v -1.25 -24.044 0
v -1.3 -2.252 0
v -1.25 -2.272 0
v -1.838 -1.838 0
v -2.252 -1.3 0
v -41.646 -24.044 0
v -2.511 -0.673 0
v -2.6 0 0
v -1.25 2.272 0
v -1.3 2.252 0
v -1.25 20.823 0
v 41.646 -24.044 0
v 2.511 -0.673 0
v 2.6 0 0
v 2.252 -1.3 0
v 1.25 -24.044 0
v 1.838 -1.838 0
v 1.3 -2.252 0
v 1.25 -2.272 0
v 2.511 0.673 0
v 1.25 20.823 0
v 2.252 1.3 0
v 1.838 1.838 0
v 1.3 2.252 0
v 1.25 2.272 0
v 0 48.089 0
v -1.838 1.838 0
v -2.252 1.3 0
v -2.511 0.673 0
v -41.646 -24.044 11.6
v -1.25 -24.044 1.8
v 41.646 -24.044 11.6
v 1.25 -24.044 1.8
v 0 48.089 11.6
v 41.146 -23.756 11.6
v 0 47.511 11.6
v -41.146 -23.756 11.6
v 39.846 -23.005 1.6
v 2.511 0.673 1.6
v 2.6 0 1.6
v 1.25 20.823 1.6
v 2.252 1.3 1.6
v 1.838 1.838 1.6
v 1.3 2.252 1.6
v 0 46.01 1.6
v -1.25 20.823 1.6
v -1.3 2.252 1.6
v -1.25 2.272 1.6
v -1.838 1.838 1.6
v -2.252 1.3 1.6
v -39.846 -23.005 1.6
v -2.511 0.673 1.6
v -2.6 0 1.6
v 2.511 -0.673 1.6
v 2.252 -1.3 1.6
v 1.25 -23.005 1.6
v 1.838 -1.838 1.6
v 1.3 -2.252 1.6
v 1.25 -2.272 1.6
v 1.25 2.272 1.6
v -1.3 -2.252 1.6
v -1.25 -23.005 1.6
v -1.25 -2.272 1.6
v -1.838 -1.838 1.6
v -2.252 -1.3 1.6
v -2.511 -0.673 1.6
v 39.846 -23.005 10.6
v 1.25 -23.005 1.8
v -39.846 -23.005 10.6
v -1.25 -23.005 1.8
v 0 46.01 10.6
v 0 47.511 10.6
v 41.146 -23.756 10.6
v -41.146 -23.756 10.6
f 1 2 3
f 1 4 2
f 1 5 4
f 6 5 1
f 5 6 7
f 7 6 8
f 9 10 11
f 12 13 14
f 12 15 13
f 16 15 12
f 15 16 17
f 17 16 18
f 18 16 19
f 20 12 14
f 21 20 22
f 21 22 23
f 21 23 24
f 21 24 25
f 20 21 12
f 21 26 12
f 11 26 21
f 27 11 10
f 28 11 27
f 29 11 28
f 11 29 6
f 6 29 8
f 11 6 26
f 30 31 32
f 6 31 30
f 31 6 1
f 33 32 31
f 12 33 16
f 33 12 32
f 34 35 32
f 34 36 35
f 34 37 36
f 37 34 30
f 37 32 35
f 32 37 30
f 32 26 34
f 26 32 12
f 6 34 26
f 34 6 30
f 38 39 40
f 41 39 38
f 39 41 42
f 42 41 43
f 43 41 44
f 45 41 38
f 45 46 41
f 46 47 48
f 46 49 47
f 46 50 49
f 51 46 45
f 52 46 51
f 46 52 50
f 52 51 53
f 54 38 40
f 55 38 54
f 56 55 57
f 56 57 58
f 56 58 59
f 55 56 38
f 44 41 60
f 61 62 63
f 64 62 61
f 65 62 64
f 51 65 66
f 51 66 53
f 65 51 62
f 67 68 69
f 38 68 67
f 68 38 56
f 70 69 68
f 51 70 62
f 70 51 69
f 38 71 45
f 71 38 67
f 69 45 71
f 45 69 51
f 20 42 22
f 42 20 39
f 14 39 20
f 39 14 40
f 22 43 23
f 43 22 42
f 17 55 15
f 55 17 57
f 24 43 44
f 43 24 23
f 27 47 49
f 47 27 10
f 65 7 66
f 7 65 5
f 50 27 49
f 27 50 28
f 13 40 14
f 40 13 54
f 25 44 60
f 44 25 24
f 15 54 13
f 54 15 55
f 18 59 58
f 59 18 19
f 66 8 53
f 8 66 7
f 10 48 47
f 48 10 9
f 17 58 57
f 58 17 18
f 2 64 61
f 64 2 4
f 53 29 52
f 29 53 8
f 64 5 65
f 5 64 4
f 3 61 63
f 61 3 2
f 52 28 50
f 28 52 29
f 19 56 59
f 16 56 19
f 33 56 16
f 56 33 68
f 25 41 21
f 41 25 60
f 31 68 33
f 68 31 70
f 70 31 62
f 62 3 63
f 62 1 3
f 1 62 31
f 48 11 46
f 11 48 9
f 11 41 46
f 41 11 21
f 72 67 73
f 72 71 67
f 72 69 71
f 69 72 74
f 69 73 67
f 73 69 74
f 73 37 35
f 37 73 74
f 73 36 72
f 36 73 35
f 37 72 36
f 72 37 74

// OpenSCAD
// file: params.scad
// Glorb — shared parameters (include from other files)
// Units: millimeters
// Design OD ~12 in → R = 152.4 mm to outer diffuser face

RADIUS_MM = 152.4;

// Strut chords at RADIUS_MM (from mesh/edge_lengths.csv)
STRUT_SHORT = 83.292;
STRUT_LONG  = 94.188;

// Frame (no hub nodes) — faceplate rabbet
FACEPLATE_T = 1.0;       // flush pocket depth
RIM = 2.0;               // outer rim outside faceplate
LEDGE = 1.5;             // support under faceplate
STRUT_DEPTH = 8.0;       // frame thickness inward

// Hub / strut interface (legacy OpenSCAD struts — superseded by Frame_Channels)
STRUT_OD = 6.0;
STRUT_ID = 3.2;
HUB_SOCKET_DEPTH = 6.0;
HUB_BALL = 14.0;

// Light cup (optional alternate architecture)
CUP_WALL = 1.8;
CUP_DEPTH = 10.0;
CUP_FLOOR = 1.6;
LED_BORE = 5.2;
LED_WIRE_SLOT = 2.5;

// Diffuser / faceplate
DIFFUSER_T = FACEPLATE_T;
DIFFUSER_LIP = 0.4;

// Column / base / sphere sleeve
COLUMN_OD_IN = 22.0;     // section inside sphere (above ridge)
COLUMN_OD_BASE = 28.0;   // wider below ridge (mount stop)
COLUMN_ID = 16.0;
COLUMN_INTO_SPHERE = 50.8;  // 2.00 in
COLUMN_BELOW_RIDGE = 100.0;
SLEEVE_ID = 22.4;        // slip on COLUMN_OD_IN
SLEEVE_OD = 32.0;
SLEEVE_LEN = 40.0;
SLEEVE_FLANGE_OD = 36.0;
SLEEVE_FLANGE_T = 3.0;
BASE_D = 170.0;              // top outer OD (skirt); pack+DevKit+buck+stays+lip
BASE_FLOOR_T = 2.0;          // min floor thickness
BASE_SHELL_T = 5.0;          // lid thickness (column socket sits on this)
BASE_CLEAR_H = 44.45;        // 1.75 in interior clearance (battery-safe)
BASE_WALL_T = 5.0;           // BaseTop skirt wall
BASE_LIP_T = 2.5;            // BaseTub short register wall
BASE_LIP_H = 10.0;           // lip height top skirt slides over
BASE_SLIP = 0.4;             // diametral clearance top-ID vs lip-OD
BASE_H = BASE_FLOOR_T + BASE_CLEAR_H + BASE_SHELL_T;  // 51.45 mm overall
BASE_ID = BASE_D - 2 * BASE_WALL_T;  // top skirt ID (~160 mm)
BASE_LIP_OD = BASE_ID - BASE_SLIP;
BASE_BAY_ID = BASE_LIP_OD - 2 * BASE_LIP_T;  // clear inside tub lip

// Bay envelopes (mm) — leave air around; confirm on arrival
BATT_XYZ = [72, 57, 39];           // NYI 12V 6000mAh (2.83x2.26x1.52 in)
BATT_URL = "https://www.amazon.com/dp/B0FDVGB87N";
BATT_OUT_A = 3.0;                  // max continuous output (A)
// Charge with included 12.6V/2A supply only (not a plain 12V adapter)
BUCK_XYZ = [17.5, 12.3, 4.3];      // MP1584EN fixed 5V mini (Amazon B0B779ZYN1)
BUCK_URL = "https://www.amazon.com/dp/B0B779ZYN1";
// Common ESP32-WROOM DevKit (30-pin DOIT/clone ~51.5x28; DevKitC ~55x28 w/ antenna)
// Keep-out includes USB overhang + header height
ESP32_XYZ = [55, 30, 15];
ESP32_NOTE = "ESP32-WROOM DevKit class (home stock)";
JACK_HOLE_D = 12.0;                // panel barrel jack (charger / 12V in)
JACK_CENTER_Z = BASE_FLOOR_T + 20; // above lip — skirt opens into bay
// Base orientation: −Y = front (power switch), +Y = back (DC jack)

// DaierTek KCD1-5-101 round rocker (Amazon B07S1MV462) — snap-in Ø20 mm
SW_HOLE_D = 20.2;                  // print clearance on 20 mm mounting hole
SW_CBORE_D = 24.0;                 // underside counterbore (snap land)
SW_PANEL_T = 2.0;                  // remaining lid thickness at switch
SW_POS = [0, -50];                 // mm on BaseTop lid — front (−Y)
SW_URL = "https://www.amazon.com/dp/B07S1MV462";

// legacy alias
COLUMN_OD = COLUMN_OD_IN;
COLUMN_LEN = COLUMN_INTO_SPHERE + COLUMN_BELOW_RIDGE;
// main file
// Glorb — triangular light cup (opaque)
// FACE_TYPE "A" or "B" picks equilateral vs isosceles placeholder geometry.
// Final: drive side lengths from facet_led_map.csv edge0/1/2 for each geo_id.

include <params.scad>

FACE_TYPE = "A"; // "A" or "B"

SIDE_A = FACE_TYPE == "A" ? STRUT_SHORT : STRUT_SHORT;
SIDE_B = FACE_TYPE == "A" ? STRUT_SHORT : STRUT_SHORT;
SIDE_C = FACE_TYPE == "A" ? STRUT_SHORT : STRUT_LONG;

module triangle_prism(s1, s2, s3, h, inset=0) {
    a = s1 - 2 * inset;
    b = s2 - 2 * inset;
    c = s3 - 2 * inset;
    sp = (a + b + c) / 2;
    area = sqrt(max(sp * (sp - a) * (sp - b) * (sp - c), 0.001));
    ha = 2 * area / a;
    x2 = (a*a + c*c - b*b) / (2 * a);
    pts = [[0, 0], [a, 0], [x2, ha]];
    cx = (pts[0][0] + pts[1][0] + pts[2][0]) / 3;
    cy = (pts[0][1] + pts[1][1] + pts[2][1]) / 3;
    linear_extrude(height=h)
        polygon([for (p = pts) [p[0] - cx, p[1] - cy]]);
}

module cup() {
    difference() {
        triangle_prism(SIDE_A, SIDE_B, SIDE_C, CUP_DEPTH + CUP_FLOOR);
        translate([0, 0, CUP_FLOOR])
            triangle_prism(SIDE_A, SIDE_B, SIDE_C, CUP_DEPTH + 0.2, inset=CUP_WALL);
        translate([0, 0, -0.1])
            cylinder(d=LED_BORE, h=CUP_FLOOR + 0.3, $fn=24);
        translate([0, -max(SIDE_A, SIDE_B, SIDE_C)/4, CUP_FLOOR/2])
            cube([LED_WIRE_SLOT, max(SIDE_A, SIDE_B, SIDE_C), CUP_FLOOR + 0.4], center=true);
        translate([0, 0, CUP_DEPTH + CUP_FLOOR - DIFFUSER_T])
            triangle_prism(SIDE_A, SIDE_B, SIDE_C, DIFFUSER_T + 0.2, inset=0.5);
    }
}

echo(str("cup type=", FACE_TYPE));
cup();
